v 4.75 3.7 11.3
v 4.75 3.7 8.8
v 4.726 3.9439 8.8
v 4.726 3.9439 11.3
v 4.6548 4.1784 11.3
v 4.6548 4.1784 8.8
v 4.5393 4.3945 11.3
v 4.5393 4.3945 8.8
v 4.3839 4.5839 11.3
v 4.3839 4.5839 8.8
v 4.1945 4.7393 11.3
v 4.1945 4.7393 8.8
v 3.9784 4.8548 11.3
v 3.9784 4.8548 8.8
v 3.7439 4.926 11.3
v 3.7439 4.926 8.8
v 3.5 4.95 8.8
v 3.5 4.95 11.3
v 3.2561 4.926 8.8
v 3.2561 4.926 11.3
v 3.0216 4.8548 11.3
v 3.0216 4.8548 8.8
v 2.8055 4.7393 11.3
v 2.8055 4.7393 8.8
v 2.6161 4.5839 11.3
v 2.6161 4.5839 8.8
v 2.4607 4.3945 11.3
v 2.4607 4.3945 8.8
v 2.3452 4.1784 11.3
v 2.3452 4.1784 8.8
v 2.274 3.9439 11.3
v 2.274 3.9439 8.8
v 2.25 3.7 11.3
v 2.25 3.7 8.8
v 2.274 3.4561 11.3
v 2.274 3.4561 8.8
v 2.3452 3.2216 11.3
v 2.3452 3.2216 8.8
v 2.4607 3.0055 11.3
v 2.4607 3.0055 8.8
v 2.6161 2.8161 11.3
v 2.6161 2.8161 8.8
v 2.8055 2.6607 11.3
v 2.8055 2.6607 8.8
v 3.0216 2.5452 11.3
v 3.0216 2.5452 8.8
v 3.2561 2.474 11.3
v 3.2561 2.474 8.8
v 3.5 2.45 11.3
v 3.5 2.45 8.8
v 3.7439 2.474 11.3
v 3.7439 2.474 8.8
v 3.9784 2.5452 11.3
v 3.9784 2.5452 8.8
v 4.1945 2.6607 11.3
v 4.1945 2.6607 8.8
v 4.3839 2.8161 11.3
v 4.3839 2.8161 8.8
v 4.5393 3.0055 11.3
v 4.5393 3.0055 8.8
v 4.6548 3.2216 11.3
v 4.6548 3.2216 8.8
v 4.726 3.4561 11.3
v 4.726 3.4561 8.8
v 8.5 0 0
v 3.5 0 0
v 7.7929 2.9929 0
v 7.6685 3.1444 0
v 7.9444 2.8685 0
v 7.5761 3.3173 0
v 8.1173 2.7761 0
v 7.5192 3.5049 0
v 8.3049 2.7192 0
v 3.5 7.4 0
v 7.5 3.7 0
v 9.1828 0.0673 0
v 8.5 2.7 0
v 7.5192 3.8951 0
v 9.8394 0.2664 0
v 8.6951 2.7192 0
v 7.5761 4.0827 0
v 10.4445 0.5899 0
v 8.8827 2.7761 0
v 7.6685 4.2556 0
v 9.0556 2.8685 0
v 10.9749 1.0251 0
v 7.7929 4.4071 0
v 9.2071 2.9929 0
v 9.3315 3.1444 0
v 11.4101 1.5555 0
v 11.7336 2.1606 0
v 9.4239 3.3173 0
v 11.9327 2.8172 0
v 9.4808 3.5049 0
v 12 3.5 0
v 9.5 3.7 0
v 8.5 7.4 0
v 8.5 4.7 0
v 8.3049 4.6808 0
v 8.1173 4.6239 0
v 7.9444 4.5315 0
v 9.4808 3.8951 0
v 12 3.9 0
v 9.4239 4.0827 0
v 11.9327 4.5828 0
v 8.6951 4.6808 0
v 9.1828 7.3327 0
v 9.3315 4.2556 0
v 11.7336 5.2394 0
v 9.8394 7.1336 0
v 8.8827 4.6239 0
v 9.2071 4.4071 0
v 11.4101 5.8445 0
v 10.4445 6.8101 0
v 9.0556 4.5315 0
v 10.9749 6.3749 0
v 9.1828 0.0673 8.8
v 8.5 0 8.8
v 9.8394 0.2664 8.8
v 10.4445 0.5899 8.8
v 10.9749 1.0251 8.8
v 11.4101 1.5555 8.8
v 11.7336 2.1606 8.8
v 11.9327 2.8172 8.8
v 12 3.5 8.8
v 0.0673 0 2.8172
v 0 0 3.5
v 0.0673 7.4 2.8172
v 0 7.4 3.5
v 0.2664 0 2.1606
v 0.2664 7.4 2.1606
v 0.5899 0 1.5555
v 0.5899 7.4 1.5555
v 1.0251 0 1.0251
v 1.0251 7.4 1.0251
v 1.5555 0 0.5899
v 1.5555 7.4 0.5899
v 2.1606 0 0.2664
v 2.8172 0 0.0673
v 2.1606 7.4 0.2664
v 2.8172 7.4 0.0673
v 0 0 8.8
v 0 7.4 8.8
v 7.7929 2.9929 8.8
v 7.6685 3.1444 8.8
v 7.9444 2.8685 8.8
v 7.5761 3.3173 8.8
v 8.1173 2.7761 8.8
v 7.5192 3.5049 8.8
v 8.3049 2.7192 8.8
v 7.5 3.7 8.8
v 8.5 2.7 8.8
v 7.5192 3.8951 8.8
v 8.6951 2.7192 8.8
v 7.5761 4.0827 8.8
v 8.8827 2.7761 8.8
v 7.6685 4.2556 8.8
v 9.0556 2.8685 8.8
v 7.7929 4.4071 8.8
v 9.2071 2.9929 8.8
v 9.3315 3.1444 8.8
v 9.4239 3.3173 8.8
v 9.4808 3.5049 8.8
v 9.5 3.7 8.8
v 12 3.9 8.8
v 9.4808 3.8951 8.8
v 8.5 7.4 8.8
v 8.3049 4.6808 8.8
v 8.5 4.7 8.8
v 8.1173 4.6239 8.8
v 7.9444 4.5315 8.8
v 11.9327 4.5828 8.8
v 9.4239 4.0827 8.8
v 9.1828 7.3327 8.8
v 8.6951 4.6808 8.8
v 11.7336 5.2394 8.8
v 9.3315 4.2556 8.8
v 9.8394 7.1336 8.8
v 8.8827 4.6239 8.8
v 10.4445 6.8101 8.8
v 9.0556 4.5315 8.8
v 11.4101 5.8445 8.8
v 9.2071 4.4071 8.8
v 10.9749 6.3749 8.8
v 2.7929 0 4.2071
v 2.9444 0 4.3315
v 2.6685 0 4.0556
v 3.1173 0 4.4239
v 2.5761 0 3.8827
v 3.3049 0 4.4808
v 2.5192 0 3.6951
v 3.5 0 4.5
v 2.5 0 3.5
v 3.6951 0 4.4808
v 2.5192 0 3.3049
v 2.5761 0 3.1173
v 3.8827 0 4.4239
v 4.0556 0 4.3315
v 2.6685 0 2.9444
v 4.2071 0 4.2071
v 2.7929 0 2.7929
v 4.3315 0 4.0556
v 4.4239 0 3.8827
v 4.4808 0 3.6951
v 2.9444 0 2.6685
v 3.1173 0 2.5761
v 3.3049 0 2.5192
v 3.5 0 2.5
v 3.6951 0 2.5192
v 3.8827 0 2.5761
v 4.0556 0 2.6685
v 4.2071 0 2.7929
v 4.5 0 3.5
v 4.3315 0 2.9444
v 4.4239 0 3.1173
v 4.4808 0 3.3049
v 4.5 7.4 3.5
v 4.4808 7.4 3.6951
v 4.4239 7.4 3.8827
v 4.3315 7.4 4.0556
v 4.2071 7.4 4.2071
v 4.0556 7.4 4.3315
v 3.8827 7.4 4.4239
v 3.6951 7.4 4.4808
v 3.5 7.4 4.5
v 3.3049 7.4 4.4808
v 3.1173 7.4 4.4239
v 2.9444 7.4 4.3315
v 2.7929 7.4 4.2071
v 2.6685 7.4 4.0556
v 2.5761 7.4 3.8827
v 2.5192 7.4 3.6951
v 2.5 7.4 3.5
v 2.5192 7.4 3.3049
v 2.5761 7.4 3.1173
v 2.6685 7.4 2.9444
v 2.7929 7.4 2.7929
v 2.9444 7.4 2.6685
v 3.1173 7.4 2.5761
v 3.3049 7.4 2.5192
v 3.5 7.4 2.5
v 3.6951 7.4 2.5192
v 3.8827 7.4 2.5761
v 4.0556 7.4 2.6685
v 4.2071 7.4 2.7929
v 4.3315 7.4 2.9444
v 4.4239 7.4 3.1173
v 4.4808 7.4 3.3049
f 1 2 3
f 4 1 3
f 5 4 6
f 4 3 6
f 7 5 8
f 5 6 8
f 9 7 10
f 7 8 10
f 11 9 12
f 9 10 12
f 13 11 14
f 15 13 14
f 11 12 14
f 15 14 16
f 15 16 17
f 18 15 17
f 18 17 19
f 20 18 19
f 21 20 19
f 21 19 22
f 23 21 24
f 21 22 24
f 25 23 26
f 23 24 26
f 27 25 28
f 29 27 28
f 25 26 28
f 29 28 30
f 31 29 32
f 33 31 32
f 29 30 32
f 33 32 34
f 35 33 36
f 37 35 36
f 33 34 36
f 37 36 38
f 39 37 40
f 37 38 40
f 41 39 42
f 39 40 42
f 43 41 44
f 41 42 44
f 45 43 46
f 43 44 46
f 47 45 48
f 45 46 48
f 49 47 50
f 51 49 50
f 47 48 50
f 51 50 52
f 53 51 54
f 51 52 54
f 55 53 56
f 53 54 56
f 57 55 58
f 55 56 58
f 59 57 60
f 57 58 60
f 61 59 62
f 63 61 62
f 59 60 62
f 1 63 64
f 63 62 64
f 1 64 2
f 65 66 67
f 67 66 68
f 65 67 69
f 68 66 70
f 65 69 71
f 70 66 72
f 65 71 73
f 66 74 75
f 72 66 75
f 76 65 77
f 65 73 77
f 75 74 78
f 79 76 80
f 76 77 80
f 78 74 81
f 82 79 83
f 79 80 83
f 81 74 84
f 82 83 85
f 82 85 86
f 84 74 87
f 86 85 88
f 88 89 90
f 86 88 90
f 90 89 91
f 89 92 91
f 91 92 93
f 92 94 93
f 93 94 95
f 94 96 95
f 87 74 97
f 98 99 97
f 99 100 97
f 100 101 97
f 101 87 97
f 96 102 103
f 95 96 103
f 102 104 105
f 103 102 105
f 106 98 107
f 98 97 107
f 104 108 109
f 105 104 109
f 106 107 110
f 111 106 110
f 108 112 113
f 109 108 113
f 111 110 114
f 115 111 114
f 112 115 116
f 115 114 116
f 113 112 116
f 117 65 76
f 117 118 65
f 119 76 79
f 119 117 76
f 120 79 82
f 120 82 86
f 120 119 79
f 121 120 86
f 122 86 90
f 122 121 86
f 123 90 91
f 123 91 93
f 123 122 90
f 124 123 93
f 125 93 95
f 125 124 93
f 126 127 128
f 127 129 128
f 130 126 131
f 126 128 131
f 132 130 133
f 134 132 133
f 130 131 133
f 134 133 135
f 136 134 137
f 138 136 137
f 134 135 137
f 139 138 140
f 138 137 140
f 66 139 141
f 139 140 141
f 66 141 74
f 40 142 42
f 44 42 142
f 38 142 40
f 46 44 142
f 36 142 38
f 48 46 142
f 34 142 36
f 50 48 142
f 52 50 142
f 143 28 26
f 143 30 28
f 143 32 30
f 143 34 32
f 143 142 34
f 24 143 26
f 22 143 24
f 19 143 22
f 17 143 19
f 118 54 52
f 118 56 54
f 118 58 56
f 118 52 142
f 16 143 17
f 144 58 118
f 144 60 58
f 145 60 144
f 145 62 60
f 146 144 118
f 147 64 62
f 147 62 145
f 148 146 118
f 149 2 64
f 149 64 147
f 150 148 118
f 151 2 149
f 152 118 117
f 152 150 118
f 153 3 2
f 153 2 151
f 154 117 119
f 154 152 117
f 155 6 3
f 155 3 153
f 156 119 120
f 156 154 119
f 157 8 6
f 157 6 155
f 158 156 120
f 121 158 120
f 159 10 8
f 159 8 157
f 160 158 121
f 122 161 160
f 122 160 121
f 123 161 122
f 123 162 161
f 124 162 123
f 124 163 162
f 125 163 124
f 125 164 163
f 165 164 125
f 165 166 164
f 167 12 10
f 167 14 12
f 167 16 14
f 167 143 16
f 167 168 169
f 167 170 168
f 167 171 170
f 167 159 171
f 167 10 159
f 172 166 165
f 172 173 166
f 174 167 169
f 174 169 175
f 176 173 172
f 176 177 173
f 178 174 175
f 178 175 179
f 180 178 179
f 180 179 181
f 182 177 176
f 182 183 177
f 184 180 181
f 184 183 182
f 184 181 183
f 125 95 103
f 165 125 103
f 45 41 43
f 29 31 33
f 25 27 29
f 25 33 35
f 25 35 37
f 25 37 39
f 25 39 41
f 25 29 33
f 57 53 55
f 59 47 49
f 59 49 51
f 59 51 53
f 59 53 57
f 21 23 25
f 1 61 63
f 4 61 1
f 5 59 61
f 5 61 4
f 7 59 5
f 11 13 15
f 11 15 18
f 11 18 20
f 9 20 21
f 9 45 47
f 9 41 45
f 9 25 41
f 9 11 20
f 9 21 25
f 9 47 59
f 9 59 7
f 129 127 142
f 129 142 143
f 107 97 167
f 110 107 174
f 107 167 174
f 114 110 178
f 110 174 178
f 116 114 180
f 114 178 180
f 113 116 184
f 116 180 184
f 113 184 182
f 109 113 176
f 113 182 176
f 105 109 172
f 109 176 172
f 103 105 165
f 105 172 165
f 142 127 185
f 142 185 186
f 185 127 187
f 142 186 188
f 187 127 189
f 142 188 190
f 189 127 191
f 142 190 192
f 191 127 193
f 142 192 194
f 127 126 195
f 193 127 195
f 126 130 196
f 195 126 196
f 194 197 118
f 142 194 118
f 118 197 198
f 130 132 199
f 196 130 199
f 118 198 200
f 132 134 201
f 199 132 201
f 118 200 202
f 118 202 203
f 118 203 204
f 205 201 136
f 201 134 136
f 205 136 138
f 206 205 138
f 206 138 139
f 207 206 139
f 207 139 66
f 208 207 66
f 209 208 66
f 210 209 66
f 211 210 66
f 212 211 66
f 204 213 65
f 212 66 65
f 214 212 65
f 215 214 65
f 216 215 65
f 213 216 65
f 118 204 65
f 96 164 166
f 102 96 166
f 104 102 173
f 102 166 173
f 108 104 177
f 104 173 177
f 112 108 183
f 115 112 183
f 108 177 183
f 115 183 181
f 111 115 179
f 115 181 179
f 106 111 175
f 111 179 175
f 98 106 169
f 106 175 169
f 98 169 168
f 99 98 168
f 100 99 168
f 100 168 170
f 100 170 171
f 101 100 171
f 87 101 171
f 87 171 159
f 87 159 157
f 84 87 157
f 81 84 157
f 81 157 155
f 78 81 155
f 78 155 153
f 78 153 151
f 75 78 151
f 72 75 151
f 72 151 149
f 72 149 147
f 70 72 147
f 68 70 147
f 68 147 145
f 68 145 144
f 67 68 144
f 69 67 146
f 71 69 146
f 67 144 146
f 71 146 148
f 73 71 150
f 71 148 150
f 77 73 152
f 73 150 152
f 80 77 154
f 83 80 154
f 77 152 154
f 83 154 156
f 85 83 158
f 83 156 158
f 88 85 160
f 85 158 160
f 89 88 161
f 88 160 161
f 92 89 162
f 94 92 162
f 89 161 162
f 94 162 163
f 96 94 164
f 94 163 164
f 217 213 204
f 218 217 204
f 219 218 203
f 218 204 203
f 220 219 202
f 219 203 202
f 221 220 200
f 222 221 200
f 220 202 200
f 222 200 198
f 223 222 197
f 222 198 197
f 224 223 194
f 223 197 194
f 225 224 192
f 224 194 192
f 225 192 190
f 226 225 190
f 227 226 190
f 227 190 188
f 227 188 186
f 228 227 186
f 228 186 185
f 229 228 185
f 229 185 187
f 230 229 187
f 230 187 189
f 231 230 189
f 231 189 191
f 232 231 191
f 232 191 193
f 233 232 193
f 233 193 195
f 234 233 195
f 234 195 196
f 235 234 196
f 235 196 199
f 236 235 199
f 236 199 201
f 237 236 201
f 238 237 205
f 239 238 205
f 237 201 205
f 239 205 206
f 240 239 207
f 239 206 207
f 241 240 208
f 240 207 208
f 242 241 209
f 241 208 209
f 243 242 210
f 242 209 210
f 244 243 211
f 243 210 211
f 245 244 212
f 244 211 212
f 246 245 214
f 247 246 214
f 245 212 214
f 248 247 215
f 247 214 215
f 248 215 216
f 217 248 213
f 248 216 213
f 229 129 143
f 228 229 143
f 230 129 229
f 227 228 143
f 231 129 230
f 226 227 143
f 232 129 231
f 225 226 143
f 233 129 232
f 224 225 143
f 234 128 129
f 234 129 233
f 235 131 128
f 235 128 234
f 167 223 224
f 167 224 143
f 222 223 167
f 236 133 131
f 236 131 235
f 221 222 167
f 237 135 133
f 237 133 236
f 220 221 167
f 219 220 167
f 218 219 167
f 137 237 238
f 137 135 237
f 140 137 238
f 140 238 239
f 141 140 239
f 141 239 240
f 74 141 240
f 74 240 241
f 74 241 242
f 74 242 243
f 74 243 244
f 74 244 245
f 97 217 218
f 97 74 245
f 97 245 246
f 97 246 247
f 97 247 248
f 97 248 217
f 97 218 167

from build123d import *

# Parameters (mm, degrees)
F0_W     = 12
F0_H     = 7.4
F1_DEPTH = 8.8
F2_R     = 1
F3_DEPTH = 25
F4_R     = 3.5
F5_R     = 3.5
F6_R     = 1.25
F7_DEPTH = 2.5
F6_R_2   = 1
F8_DEPTH = 25


with BuildPart() as f1:
    # F0 (on Top) → F1 (new body)
    with BuildSketch(Plane.XY):
        with Locations((6, 3.7)):
            Rectangle(F0_W, F0_H)
    extrude(amount=F1_DEPTH)

    # F2 (on face) → F3 (cut)
    with BuildSketch(Plane.XZ):
        with Locations((3.5, 3.5)):
            Circle(F2_R)
    extrude(amount=-F3_DEPTH, mode=Mode.SUBTRACT)

    # F4
    f4_edges = [f1.edges().sort_by_distance(p)[0] for p in [
        (0, 3.7, 0),
    ]]
    fillet(f4_edges, radius=F4_R)

    # F5
    f5_edges = [f1.edges().sort_by_distance(p)[0] for p in [
        (12, 0, 4.4),
        (12, 7.4, 4.4),
    ]]
    fillet(f5_edges, radius=F5_R)

    # F6 (on face) → F7 (join)
    with BuildSketch(Plane.XY.offset(8.8)):
        with Locations((3.5, 3.7)):
            Circle(F6_R)
    extrude(amount=F7_DEPTH)

    # F6 (on face) → F8 (cut)
    with BuildSketch(Plane.XY.offset(8.8)):
        with Locations((8.5, 3.7)):
            Circle(F6_R_2)
    extrude(amount=-F8_DEPTH, mode=Mode.SUBTRACT)


solid = f1.part
